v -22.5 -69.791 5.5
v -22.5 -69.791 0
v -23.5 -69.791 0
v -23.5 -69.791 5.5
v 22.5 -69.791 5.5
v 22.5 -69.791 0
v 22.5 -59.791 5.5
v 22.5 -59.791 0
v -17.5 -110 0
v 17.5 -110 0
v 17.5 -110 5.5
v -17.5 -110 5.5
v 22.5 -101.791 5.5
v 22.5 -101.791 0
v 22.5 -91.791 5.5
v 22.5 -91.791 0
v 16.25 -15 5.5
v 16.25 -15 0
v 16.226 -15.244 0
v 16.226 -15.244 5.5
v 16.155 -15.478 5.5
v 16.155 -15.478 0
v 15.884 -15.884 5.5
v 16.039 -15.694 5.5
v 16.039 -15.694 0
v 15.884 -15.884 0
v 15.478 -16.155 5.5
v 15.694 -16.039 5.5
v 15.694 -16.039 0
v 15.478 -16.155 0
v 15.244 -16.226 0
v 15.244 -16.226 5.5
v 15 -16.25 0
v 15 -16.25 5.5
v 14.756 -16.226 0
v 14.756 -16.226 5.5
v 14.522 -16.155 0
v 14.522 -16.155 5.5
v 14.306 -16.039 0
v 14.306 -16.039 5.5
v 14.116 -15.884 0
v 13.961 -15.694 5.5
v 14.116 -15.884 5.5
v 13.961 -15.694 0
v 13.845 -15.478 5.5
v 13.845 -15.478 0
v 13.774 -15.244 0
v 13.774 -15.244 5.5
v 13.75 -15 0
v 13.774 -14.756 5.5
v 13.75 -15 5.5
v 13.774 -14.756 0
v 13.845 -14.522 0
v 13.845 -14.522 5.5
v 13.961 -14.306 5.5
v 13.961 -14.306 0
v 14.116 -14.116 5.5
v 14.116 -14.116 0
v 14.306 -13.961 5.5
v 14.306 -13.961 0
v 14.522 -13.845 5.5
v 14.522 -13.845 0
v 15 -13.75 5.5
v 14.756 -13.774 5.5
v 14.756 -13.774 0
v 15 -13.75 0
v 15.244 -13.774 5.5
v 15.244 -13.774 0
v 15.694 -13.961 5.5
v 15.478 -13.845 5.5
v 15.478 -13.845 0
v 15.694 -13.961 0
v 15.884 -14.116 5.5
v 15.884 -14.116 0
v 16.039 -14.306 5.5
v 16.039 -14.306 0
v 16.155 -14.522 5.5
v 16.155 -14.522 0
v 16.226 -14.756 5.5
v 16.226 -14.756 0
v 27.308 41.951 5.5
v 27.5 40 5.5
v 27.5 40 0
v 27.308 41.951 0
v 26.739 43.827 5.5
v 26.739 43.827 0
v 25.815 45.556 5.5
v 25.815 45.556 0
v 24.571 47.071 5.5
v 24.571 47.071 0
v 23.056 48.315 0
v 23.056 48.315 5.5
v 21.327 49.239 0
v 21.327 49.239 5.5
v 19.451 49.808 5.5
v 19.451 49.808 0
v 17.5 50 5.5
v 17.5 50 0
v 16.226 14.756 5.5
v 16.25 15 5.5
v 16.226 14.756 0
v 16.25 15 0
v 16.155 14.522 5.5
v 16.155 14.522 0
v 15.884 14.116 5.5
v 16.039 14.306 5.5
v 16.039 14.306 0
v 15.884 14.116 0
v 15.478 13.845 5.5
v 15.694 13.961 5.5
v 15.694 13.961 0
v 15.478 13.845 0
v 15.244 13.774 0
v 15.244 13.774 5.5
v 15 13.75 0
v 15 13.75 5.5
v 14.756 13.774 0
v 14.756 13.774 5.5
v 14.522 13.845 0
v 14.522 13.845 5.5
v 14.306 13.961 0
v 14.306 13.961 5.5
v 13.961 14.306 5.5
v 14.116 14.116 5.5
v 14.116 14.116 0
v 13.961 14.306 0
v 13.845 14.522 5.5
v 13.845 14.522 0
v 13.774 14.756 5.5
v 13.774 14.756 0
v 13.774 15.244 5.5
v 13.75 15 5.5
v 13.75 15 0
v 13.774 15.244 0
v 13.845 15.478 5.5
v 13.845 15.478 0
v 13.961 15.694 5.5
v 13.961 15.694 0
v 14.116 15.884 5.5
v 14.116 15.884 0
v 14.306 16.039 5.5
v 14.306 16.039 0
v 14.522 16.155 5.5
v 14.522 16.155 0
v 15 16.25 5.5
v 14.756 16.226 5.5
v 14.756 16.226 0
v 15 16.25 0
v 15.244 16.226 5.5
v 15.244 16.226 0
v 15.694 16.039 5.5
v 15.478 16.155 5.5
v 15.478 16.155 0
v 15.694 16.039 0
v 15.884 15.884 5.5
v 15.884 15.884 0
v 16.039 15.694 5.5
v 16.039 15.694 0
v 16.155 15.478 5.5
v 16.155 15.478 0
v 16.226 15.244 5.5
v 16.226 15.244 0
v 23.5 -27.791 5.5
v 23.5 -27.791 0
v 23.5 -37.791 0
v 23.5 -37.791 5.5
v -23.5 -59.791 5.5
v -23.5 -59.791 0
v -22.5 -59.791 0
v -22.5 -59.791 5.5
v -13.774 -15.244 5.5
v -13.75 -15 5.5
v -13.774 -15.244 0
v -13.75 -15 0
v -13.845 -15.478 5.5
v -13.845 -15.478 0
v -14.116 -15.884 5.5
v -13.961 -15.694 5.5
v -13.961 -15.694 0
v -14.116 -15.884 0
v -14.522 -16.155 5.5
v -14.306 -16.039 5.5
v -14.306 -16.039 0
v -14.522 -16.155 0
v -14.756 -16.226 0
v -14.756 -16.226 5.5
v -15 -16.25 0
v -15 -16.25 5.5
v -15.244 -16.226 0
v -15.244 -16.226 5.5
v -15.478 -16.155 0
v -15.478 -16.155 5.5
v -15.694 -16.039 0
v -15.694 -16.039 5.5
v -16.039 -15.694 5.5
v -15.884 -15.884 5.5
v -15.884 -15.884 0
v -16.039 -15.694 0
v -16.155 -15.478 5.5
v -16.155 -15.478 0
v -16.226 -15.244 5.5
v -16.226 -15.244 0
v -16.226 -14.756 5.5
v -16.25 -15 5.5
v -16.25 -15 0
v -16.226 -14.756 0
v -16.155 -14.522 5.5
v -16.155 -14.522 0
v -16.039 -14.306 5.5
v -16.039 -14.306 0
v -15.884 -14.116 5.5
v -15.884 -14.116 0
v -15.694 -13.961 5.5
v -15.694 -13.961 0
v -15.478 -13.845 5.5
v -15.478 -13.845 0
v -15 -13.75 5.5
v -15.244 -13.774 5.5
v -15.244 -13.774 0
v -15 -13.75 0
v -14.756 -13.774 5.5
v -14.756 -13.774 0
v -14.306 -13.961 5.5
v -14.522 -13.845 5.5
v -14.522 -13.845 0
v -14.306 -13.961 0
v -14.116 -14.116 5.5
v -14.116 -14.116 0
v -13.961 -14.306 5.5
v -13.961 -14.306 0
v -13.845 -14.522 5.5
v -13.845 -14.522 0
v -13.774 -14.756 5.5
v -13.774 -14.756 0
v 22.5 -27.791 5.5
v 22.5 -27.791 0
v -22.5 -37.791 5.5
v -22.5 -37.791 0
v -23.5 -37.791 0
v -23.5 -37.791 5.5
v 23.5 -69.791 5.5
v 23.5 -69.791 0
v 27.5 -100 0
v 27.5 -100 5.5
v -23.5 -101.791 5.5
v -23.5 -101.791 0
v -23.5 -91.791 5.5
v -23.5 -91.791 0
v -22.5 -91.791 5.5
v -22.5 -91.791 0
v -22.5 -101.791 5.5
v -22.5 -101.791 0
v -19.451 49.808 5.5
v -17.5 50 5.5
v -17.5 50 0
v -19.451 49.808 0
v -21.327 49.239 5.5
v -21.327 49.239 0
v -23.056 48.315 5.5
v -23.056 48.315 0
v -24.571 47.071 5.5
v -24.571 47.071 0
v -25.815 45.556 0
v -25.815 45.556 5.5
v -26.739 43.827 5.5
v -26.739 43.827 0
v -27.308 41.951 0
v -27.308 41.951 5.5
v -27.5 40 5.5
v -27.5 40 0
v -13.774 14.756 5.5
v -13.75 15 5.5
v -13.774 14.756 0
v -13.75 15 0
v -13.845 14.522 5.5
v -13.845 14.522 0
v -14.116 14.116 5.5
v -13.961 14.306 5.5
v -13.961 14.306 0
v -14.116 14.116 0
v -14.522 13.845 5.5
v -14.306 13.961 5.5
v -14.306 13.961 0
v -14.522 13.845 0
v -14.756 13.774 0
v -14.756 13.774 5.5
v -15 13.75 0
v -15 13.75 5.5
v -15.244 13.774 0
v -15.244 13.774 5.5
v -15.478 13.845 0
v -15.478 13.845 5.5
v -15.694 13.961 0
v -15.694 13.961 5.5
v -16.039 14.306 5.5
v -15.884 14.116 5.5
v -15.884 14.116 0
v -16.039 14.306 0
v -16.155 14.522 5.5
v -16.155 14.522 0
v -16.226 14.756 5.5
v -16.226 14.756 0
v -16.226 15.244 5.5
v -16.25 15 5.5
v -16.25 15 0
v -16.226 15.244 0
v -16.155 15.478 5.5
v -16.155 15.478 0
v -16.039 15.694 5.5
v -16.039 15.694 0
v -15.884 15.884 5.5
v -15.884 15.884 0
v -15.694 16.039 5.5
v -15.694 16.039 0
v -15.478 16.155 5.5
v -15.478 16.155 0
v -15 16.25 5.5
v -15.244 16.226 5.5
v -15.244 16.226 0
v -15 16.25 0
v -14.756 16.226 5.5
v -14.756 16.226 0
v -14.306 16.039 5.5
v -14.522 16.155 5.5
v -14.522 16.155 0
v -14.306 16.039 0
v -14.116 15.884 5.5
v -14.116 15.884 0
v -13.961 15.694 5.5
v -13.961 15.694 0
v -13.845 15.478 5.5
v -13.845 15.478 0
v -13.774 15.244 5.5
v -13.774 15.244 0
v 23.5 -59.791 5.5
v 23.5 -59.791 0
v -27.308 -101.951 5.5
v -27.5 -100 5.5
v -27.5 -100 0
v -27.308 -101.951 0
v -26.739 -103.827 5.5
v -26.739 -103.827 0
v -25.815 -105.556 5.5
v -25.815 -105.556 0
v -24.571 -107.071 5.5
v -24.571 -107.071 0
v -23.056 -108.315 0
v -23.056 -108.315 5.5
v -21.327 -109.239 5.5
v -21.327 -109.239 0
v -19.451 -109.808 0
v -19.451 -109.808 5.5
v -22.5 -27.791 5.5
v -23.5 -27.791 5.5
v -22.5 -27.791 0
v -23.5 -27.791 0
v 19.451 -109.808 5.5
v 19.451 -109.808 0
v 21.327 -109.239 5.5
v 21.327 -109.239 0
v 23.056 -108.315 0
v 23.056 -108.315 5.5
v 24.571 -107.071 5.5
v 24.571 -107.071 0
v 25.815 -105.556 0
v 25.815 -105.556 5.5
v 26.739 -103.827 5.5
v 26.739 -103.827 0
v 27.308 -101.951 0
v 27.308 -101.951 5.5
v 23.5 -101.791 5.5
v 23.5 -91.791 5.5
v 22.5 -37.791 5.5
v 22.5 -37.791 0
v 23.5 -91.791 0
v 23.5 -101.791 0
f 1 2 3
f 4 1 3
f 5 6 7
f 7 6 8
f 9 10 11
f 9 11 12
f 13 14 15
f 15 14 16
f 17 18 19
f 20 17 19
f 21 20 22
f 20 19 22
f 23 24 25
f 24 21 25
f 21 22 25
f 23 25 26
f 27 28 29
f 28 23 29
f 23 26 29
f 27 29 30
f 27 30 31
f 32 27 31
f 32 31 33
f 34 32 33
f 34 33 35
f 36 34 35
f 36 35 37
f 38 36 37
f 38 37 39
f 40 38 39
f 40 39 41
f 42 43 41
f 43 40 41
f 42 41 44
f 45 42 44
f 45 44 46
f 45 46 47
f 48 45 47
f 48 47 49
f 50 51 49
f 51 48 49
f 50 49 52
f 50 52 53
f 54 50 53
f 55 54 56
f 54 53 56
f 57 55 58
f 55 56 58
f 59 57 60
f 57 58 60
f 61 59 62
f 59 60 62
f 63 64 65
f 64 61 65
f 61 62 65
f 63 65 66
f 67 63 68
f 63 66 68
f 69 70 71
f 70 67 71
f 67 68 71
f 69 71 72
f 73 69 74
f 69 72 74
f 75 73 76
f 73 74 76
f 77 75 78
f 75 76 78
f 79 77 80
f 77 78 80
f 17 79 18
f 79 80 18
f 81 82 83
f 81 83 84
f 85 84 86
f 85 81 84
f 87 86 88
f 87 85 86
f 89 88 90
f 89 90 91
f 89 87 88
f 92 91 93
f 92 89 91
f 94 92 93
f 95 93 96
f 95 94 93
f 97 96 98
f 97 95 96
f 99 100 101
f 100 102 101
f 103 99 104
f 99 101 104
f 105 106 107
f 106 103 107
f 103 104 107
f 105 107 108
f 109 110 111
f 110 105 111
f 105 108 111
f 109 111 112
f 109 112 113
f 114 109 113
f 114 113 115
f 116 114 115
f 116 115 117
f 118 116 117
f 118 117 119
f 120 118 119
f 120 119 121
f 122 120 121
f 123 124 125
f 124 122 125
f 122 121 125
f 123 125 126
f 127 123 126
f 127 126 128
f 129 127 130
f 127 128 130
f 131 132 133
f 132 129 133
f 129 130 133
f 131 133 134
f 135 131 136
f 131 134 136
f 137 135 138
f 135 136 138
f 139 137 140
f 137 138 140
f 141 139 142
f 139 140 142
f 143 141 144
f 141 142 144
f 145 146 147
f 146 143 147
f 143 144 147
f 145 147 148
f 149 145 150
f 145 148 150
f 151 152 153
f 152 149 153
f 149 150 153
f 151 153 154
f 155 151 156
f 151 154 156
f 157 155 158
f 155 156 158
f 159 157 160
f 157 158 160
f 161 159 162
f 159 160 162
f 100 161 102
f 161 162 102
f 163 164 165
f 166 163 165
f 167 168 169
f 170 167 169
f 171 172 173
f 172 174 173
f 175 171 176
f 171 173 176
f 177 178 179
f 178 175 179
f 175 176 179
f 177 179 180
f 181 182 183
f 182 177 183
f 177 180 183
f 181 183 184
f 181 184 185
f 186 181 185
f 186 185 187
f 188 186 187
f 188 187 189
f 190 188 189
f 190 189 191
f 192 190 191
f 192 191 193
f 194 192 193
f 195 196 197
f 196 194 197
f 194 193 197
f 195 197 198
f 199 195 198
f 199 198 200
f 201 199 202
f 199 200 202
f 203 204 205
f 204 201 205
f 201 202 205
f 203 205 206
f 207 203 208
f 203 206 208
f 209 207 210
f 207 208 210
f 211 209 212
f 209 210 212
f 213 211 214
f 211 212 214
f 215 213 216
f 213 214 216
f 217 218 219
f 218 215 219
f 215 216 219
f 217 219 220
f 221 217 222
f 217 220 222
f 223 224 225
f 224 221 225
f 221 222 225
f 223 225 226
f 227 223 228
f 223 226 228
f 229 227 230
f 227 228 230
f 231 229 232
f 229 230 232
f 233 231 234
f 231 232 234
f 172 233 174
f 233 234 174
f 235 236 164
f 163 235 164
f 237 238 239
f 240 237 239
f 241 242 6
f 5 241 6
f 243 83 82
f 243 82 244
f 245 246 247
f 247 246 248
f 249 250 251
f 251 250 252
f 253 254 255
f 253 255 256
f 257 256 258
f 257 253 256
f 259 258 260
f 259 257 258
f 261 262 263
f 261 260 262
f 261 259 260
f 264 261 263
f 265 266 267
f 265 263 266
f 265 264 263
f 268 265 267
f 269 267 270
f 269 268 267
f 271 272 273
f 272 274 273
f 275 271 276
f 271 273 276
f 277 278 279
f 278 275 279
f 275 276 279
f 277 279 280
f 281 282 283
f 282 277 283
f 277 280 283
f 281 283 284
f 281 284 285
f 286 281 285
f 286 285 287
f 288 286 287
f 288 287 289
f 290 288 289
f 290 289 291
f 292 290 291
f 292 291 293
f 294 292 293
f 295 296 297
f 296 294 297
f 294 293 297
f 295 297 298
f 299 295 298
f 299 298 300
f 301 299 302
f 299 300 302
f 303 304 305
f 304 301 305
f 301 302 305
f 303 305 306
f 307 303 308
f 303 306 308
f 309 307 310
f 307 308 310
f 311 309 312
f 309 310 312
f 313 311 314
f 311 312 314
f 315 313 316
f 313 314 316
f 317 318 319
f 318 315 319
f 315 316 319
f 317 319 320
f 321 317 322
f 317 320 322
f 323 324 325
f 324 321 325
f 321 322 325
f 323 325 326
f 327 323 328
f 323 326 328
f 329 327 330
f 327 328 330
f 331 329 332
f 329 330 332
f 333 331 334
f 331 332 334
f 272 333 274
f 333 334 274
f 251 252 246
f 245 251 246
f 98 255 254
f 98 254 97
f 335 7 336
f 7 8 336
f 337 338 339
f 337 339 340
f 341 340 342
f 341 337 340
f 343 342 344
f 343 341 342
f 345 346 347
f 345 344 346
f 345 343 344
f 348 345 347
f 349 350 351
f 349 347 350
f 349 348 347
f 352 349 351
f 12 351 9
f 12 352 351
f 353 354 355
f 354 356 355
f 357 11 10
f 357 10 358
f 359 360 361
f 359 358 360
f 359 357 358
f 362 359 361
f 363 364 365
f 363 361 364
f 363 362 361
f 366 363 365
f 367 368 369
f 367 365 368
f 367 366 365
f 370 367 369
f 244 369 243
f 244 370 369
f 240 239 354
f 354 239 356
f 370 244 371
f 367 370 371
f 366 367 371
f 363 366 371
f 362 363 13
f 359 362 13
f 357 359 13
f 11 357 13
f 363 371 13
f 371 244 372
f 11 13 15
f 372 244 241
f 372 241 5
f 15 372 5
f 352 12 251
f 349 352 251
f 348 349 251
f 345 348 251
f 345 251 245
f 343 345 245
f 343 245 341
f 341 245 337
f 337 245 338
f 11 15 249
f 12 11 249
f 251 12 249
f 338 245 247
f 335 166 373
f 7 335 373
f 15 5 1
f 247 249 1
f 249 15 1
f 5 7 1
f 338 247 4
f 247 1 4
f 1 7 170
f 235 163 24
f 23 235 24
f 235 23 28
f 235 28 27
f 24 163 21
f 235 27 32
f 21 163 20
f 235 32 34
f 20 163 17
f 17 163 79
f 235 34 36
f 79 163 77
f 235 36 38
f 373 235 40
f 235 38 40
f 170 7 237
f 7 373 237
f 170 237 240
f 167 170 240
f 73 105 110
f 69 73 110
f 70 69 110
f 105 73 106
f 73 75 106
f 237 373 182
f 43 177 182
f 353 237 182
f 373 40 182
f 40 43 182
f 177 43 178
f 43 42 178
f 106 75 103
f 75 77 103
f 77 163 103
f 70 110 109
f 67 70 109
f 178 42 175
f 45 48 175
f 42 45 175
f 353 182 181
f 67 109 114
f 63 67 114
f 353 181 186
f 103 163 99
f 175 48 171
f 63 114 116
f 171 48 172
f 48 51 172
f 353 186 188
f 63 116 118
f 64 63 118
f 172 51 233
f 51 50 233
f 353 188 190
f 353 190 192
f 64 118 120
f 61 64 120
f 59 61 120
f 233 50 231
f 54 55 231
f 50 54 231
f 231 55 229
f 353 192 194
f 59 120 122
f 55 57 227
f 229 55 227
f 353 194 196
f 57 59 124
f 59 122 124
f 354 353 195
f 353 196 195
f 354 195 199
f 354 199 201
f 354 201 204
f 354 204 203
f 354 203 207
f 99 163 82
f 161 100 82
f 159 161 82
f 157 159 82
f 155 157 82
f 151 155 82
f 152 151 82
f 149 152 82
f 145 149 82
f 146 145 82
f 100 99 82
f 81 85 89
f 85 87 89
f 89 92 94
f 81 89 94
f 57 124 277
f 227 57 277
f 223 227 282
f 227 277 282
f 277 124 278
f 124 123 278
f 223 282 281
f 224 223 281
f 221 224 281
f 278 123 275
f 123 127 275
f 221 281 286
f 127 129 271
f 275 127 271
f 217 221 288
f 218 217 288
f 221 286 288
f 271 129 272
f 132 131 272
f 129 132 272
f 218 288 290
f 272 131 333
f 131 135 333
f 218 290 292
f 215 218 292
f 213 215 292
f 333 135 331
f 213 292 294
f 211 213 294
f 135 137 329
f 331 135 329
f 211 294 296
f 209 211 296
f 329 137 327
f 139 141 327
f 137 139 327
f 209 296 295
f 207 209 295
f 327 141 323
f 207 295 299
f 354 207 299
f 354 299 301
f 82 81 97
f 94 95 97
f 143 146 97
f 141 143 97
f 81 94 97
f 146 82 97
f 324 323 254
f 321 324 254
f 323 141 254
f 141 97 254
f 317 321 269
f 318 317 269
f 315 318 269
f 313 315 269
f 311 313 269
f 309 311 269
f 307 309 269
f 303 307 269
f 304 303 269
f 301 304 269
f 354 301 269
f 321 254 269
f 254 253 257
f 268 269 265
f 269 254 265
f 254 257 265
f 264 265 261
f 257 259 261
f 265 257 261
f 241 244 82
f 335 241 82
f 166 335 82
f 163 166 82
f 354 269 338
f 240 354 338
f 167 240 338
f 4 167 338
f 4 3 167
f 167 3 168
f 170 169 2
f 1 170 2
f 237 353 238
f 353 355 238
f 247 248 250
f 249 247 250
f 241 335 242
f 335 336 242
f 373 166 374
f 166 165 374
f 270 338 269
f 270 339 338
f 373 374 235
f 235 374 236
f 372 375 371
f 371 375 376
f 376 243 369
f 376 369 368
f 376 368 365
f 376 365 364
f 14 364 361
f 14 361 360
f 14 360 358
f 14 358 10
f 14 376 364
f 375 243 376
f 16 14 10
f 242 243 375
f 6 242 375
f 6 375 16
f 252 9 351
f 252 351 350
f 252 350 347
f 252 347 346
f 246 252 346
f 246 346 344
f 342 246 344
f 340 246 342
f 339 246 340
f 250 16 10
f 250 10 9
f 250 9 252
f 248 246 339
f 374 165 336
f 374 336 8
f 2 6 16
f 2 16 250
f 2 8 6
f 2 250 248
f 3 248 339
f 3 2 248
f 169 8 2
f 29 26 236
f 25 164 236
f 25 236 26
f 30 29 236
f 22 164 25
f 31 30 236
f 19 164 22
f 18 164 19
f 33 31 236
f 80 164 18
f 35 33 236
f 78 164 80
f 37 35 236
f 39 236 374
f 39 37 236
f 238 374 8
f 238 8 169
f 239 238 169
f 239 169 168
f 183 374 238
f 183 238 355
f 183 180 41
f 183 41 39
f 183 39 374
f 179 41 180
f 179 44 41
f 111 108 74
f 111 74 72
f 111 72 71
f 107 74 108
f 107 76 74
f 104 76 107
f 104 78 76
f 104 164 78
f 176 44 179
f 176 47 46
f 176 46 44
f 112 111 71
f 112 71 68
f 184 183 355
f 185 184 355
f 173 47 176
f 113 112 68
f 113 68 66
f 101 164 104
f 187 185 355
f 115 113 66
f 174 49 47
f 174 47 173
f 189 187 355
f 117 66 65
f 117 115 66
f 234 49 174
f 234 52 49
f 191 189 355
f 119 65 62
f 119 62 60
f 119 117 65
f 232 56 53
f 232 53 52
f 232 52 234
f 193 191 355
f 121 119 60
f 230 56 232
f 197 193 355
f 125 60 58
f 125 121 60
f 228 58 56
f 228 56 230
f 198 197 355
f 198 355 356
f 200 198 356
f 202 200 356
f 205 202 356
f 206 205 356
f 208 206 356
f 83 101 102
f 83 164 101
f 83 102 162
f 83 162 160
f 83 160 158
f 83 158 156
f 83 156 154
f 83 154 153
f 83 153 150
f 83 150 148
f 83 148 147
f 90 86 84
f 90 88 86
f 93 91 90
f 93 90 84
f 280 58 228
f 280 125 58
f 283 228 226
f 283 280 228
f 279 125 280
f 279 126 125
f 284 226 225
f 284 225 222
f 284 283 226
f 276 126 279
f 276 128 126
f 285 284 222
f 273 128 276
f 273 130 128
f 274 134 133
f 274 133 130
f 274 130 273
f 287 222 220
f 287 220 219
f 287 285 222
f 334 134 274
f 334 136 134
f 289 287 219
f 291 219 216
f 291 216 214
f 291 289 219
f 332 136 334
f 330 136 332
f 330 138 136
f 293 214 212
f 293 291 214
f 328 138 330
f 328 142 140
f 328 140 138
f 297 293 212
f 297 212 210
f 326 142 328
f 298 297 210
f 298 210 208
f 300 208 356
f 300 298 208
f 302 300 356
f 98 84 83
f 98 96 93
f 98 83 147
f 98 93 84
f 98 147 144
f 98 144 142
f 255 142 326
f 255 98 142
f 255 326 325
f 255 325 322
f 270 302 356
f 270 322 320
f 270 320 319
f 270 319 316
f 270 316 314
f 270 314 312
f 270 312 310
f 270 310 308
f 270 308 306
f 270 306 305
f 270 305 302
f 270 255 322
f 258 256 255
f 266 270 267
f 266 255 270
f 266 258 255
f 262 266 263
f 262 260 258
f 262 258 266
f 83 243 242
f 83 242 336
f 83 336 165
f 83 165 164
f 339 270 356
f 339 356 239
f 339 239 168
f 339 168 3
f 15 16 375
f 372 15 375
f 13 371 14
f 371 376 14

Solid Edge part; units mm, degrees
sketch "Sketch1" plane through (0, 0, 0) normal (0, 0, 1) x (1, 0, 0)
  line L0 (27.5, 50) -> (27.5, -110)
  line L1 (27.5, -110) -> (-27.5, -110)
  line L2 (-27.5, -110) -> (-27.5, 50)
  line L3 (-27.5, 50) -> (27.5, 50)
  circle A0 centre (-15, 15) radius 1.25
  circle A1 centre (-15, -15) radius 1.25
  circle A2 centre (15, -15) radius 1.25
  circle A3 centre (15, 15) radius 1.25
  dimension "D1" = 80
  dimension "D2" = 43
  dimension "D3" = 30
  dimension "D4" = 30
  dimension "D5" = 10
  dimension "D6" = 5
  dimension "D7" = 110
  dimension "D8" = 55
  dimension "D9" = 50
  dimension "D10" = 1
  dimension "D11" = 1
  dimension "D12" = 4
  dimension "D13" = 10
  dimension "D14" = 22
  dimension "D15" = 22
extrude "Protrusion1" add sketch "Sketch1" along normal blind 5.5
fillet "Round_1" radius 10 4 edges at (27.5, 50, 2.75) (-27.5, 50, 2.75) (-27.5, -110, 2.75) (27.5, -110, 2.75)
sketch "Sketch2" plane through (0, 0, 0) normal (0, 0, 1) x (1, 0, 0)
  line L0 (23.5, -27.7908) -> (23.5, -37.7908)
  line L1 (23.5, -37.7908) -> (22.5, -37.7908)
  line L2 (22.5, -37.7908) -> (22.5, -27.7908)
  line L3 (22.5, -27.7908) -> (23.5, -27.7908)
  line L4 (23.5, -59.7908) -> (23.5, -69.7908)
  line L5 (23.5, -69.7908) -> (22.5, -69.7908)
  line L6 (22.5, -69.7908) -> (22.5, -59.7908)
  line L7 (22.5, -59.7908) -> (23.5, -59.7908)
  line L8 (23.5, -91.7908) -> (23.5, -101.7908)
  line L9 (23.5, -101.7908) -> (22.5, -101.7908)
  line L10 (22.5, -101.7908) -> (22.5, -91.7908)
  line L11 (22.5, -91.7908) -> (23.5, -91.7908)
  dimension "D1" = 80
  dimension "D2" = 43
  dimension "D3" = 30
  dimension "D4" = 30
  dimension "D5" = 10
  dimension "D6" = 5
  dimension "D7" = 110
  dimension "D8" = 55
  dimension "D9" = 50
  dimension "D10" = 1
  dimension "D11" = 1
  dimension "D12" = 4
  dimension "D13" = 10
  dimension "D14" = 22
  dimension "D15" = 22
extrude "Cutout1" cut sketch "Sketch2" along normal through all
mirror "Mirror1" about plane through (0, 0, 0) normal (1, 0, 0) of "Cutout1"
